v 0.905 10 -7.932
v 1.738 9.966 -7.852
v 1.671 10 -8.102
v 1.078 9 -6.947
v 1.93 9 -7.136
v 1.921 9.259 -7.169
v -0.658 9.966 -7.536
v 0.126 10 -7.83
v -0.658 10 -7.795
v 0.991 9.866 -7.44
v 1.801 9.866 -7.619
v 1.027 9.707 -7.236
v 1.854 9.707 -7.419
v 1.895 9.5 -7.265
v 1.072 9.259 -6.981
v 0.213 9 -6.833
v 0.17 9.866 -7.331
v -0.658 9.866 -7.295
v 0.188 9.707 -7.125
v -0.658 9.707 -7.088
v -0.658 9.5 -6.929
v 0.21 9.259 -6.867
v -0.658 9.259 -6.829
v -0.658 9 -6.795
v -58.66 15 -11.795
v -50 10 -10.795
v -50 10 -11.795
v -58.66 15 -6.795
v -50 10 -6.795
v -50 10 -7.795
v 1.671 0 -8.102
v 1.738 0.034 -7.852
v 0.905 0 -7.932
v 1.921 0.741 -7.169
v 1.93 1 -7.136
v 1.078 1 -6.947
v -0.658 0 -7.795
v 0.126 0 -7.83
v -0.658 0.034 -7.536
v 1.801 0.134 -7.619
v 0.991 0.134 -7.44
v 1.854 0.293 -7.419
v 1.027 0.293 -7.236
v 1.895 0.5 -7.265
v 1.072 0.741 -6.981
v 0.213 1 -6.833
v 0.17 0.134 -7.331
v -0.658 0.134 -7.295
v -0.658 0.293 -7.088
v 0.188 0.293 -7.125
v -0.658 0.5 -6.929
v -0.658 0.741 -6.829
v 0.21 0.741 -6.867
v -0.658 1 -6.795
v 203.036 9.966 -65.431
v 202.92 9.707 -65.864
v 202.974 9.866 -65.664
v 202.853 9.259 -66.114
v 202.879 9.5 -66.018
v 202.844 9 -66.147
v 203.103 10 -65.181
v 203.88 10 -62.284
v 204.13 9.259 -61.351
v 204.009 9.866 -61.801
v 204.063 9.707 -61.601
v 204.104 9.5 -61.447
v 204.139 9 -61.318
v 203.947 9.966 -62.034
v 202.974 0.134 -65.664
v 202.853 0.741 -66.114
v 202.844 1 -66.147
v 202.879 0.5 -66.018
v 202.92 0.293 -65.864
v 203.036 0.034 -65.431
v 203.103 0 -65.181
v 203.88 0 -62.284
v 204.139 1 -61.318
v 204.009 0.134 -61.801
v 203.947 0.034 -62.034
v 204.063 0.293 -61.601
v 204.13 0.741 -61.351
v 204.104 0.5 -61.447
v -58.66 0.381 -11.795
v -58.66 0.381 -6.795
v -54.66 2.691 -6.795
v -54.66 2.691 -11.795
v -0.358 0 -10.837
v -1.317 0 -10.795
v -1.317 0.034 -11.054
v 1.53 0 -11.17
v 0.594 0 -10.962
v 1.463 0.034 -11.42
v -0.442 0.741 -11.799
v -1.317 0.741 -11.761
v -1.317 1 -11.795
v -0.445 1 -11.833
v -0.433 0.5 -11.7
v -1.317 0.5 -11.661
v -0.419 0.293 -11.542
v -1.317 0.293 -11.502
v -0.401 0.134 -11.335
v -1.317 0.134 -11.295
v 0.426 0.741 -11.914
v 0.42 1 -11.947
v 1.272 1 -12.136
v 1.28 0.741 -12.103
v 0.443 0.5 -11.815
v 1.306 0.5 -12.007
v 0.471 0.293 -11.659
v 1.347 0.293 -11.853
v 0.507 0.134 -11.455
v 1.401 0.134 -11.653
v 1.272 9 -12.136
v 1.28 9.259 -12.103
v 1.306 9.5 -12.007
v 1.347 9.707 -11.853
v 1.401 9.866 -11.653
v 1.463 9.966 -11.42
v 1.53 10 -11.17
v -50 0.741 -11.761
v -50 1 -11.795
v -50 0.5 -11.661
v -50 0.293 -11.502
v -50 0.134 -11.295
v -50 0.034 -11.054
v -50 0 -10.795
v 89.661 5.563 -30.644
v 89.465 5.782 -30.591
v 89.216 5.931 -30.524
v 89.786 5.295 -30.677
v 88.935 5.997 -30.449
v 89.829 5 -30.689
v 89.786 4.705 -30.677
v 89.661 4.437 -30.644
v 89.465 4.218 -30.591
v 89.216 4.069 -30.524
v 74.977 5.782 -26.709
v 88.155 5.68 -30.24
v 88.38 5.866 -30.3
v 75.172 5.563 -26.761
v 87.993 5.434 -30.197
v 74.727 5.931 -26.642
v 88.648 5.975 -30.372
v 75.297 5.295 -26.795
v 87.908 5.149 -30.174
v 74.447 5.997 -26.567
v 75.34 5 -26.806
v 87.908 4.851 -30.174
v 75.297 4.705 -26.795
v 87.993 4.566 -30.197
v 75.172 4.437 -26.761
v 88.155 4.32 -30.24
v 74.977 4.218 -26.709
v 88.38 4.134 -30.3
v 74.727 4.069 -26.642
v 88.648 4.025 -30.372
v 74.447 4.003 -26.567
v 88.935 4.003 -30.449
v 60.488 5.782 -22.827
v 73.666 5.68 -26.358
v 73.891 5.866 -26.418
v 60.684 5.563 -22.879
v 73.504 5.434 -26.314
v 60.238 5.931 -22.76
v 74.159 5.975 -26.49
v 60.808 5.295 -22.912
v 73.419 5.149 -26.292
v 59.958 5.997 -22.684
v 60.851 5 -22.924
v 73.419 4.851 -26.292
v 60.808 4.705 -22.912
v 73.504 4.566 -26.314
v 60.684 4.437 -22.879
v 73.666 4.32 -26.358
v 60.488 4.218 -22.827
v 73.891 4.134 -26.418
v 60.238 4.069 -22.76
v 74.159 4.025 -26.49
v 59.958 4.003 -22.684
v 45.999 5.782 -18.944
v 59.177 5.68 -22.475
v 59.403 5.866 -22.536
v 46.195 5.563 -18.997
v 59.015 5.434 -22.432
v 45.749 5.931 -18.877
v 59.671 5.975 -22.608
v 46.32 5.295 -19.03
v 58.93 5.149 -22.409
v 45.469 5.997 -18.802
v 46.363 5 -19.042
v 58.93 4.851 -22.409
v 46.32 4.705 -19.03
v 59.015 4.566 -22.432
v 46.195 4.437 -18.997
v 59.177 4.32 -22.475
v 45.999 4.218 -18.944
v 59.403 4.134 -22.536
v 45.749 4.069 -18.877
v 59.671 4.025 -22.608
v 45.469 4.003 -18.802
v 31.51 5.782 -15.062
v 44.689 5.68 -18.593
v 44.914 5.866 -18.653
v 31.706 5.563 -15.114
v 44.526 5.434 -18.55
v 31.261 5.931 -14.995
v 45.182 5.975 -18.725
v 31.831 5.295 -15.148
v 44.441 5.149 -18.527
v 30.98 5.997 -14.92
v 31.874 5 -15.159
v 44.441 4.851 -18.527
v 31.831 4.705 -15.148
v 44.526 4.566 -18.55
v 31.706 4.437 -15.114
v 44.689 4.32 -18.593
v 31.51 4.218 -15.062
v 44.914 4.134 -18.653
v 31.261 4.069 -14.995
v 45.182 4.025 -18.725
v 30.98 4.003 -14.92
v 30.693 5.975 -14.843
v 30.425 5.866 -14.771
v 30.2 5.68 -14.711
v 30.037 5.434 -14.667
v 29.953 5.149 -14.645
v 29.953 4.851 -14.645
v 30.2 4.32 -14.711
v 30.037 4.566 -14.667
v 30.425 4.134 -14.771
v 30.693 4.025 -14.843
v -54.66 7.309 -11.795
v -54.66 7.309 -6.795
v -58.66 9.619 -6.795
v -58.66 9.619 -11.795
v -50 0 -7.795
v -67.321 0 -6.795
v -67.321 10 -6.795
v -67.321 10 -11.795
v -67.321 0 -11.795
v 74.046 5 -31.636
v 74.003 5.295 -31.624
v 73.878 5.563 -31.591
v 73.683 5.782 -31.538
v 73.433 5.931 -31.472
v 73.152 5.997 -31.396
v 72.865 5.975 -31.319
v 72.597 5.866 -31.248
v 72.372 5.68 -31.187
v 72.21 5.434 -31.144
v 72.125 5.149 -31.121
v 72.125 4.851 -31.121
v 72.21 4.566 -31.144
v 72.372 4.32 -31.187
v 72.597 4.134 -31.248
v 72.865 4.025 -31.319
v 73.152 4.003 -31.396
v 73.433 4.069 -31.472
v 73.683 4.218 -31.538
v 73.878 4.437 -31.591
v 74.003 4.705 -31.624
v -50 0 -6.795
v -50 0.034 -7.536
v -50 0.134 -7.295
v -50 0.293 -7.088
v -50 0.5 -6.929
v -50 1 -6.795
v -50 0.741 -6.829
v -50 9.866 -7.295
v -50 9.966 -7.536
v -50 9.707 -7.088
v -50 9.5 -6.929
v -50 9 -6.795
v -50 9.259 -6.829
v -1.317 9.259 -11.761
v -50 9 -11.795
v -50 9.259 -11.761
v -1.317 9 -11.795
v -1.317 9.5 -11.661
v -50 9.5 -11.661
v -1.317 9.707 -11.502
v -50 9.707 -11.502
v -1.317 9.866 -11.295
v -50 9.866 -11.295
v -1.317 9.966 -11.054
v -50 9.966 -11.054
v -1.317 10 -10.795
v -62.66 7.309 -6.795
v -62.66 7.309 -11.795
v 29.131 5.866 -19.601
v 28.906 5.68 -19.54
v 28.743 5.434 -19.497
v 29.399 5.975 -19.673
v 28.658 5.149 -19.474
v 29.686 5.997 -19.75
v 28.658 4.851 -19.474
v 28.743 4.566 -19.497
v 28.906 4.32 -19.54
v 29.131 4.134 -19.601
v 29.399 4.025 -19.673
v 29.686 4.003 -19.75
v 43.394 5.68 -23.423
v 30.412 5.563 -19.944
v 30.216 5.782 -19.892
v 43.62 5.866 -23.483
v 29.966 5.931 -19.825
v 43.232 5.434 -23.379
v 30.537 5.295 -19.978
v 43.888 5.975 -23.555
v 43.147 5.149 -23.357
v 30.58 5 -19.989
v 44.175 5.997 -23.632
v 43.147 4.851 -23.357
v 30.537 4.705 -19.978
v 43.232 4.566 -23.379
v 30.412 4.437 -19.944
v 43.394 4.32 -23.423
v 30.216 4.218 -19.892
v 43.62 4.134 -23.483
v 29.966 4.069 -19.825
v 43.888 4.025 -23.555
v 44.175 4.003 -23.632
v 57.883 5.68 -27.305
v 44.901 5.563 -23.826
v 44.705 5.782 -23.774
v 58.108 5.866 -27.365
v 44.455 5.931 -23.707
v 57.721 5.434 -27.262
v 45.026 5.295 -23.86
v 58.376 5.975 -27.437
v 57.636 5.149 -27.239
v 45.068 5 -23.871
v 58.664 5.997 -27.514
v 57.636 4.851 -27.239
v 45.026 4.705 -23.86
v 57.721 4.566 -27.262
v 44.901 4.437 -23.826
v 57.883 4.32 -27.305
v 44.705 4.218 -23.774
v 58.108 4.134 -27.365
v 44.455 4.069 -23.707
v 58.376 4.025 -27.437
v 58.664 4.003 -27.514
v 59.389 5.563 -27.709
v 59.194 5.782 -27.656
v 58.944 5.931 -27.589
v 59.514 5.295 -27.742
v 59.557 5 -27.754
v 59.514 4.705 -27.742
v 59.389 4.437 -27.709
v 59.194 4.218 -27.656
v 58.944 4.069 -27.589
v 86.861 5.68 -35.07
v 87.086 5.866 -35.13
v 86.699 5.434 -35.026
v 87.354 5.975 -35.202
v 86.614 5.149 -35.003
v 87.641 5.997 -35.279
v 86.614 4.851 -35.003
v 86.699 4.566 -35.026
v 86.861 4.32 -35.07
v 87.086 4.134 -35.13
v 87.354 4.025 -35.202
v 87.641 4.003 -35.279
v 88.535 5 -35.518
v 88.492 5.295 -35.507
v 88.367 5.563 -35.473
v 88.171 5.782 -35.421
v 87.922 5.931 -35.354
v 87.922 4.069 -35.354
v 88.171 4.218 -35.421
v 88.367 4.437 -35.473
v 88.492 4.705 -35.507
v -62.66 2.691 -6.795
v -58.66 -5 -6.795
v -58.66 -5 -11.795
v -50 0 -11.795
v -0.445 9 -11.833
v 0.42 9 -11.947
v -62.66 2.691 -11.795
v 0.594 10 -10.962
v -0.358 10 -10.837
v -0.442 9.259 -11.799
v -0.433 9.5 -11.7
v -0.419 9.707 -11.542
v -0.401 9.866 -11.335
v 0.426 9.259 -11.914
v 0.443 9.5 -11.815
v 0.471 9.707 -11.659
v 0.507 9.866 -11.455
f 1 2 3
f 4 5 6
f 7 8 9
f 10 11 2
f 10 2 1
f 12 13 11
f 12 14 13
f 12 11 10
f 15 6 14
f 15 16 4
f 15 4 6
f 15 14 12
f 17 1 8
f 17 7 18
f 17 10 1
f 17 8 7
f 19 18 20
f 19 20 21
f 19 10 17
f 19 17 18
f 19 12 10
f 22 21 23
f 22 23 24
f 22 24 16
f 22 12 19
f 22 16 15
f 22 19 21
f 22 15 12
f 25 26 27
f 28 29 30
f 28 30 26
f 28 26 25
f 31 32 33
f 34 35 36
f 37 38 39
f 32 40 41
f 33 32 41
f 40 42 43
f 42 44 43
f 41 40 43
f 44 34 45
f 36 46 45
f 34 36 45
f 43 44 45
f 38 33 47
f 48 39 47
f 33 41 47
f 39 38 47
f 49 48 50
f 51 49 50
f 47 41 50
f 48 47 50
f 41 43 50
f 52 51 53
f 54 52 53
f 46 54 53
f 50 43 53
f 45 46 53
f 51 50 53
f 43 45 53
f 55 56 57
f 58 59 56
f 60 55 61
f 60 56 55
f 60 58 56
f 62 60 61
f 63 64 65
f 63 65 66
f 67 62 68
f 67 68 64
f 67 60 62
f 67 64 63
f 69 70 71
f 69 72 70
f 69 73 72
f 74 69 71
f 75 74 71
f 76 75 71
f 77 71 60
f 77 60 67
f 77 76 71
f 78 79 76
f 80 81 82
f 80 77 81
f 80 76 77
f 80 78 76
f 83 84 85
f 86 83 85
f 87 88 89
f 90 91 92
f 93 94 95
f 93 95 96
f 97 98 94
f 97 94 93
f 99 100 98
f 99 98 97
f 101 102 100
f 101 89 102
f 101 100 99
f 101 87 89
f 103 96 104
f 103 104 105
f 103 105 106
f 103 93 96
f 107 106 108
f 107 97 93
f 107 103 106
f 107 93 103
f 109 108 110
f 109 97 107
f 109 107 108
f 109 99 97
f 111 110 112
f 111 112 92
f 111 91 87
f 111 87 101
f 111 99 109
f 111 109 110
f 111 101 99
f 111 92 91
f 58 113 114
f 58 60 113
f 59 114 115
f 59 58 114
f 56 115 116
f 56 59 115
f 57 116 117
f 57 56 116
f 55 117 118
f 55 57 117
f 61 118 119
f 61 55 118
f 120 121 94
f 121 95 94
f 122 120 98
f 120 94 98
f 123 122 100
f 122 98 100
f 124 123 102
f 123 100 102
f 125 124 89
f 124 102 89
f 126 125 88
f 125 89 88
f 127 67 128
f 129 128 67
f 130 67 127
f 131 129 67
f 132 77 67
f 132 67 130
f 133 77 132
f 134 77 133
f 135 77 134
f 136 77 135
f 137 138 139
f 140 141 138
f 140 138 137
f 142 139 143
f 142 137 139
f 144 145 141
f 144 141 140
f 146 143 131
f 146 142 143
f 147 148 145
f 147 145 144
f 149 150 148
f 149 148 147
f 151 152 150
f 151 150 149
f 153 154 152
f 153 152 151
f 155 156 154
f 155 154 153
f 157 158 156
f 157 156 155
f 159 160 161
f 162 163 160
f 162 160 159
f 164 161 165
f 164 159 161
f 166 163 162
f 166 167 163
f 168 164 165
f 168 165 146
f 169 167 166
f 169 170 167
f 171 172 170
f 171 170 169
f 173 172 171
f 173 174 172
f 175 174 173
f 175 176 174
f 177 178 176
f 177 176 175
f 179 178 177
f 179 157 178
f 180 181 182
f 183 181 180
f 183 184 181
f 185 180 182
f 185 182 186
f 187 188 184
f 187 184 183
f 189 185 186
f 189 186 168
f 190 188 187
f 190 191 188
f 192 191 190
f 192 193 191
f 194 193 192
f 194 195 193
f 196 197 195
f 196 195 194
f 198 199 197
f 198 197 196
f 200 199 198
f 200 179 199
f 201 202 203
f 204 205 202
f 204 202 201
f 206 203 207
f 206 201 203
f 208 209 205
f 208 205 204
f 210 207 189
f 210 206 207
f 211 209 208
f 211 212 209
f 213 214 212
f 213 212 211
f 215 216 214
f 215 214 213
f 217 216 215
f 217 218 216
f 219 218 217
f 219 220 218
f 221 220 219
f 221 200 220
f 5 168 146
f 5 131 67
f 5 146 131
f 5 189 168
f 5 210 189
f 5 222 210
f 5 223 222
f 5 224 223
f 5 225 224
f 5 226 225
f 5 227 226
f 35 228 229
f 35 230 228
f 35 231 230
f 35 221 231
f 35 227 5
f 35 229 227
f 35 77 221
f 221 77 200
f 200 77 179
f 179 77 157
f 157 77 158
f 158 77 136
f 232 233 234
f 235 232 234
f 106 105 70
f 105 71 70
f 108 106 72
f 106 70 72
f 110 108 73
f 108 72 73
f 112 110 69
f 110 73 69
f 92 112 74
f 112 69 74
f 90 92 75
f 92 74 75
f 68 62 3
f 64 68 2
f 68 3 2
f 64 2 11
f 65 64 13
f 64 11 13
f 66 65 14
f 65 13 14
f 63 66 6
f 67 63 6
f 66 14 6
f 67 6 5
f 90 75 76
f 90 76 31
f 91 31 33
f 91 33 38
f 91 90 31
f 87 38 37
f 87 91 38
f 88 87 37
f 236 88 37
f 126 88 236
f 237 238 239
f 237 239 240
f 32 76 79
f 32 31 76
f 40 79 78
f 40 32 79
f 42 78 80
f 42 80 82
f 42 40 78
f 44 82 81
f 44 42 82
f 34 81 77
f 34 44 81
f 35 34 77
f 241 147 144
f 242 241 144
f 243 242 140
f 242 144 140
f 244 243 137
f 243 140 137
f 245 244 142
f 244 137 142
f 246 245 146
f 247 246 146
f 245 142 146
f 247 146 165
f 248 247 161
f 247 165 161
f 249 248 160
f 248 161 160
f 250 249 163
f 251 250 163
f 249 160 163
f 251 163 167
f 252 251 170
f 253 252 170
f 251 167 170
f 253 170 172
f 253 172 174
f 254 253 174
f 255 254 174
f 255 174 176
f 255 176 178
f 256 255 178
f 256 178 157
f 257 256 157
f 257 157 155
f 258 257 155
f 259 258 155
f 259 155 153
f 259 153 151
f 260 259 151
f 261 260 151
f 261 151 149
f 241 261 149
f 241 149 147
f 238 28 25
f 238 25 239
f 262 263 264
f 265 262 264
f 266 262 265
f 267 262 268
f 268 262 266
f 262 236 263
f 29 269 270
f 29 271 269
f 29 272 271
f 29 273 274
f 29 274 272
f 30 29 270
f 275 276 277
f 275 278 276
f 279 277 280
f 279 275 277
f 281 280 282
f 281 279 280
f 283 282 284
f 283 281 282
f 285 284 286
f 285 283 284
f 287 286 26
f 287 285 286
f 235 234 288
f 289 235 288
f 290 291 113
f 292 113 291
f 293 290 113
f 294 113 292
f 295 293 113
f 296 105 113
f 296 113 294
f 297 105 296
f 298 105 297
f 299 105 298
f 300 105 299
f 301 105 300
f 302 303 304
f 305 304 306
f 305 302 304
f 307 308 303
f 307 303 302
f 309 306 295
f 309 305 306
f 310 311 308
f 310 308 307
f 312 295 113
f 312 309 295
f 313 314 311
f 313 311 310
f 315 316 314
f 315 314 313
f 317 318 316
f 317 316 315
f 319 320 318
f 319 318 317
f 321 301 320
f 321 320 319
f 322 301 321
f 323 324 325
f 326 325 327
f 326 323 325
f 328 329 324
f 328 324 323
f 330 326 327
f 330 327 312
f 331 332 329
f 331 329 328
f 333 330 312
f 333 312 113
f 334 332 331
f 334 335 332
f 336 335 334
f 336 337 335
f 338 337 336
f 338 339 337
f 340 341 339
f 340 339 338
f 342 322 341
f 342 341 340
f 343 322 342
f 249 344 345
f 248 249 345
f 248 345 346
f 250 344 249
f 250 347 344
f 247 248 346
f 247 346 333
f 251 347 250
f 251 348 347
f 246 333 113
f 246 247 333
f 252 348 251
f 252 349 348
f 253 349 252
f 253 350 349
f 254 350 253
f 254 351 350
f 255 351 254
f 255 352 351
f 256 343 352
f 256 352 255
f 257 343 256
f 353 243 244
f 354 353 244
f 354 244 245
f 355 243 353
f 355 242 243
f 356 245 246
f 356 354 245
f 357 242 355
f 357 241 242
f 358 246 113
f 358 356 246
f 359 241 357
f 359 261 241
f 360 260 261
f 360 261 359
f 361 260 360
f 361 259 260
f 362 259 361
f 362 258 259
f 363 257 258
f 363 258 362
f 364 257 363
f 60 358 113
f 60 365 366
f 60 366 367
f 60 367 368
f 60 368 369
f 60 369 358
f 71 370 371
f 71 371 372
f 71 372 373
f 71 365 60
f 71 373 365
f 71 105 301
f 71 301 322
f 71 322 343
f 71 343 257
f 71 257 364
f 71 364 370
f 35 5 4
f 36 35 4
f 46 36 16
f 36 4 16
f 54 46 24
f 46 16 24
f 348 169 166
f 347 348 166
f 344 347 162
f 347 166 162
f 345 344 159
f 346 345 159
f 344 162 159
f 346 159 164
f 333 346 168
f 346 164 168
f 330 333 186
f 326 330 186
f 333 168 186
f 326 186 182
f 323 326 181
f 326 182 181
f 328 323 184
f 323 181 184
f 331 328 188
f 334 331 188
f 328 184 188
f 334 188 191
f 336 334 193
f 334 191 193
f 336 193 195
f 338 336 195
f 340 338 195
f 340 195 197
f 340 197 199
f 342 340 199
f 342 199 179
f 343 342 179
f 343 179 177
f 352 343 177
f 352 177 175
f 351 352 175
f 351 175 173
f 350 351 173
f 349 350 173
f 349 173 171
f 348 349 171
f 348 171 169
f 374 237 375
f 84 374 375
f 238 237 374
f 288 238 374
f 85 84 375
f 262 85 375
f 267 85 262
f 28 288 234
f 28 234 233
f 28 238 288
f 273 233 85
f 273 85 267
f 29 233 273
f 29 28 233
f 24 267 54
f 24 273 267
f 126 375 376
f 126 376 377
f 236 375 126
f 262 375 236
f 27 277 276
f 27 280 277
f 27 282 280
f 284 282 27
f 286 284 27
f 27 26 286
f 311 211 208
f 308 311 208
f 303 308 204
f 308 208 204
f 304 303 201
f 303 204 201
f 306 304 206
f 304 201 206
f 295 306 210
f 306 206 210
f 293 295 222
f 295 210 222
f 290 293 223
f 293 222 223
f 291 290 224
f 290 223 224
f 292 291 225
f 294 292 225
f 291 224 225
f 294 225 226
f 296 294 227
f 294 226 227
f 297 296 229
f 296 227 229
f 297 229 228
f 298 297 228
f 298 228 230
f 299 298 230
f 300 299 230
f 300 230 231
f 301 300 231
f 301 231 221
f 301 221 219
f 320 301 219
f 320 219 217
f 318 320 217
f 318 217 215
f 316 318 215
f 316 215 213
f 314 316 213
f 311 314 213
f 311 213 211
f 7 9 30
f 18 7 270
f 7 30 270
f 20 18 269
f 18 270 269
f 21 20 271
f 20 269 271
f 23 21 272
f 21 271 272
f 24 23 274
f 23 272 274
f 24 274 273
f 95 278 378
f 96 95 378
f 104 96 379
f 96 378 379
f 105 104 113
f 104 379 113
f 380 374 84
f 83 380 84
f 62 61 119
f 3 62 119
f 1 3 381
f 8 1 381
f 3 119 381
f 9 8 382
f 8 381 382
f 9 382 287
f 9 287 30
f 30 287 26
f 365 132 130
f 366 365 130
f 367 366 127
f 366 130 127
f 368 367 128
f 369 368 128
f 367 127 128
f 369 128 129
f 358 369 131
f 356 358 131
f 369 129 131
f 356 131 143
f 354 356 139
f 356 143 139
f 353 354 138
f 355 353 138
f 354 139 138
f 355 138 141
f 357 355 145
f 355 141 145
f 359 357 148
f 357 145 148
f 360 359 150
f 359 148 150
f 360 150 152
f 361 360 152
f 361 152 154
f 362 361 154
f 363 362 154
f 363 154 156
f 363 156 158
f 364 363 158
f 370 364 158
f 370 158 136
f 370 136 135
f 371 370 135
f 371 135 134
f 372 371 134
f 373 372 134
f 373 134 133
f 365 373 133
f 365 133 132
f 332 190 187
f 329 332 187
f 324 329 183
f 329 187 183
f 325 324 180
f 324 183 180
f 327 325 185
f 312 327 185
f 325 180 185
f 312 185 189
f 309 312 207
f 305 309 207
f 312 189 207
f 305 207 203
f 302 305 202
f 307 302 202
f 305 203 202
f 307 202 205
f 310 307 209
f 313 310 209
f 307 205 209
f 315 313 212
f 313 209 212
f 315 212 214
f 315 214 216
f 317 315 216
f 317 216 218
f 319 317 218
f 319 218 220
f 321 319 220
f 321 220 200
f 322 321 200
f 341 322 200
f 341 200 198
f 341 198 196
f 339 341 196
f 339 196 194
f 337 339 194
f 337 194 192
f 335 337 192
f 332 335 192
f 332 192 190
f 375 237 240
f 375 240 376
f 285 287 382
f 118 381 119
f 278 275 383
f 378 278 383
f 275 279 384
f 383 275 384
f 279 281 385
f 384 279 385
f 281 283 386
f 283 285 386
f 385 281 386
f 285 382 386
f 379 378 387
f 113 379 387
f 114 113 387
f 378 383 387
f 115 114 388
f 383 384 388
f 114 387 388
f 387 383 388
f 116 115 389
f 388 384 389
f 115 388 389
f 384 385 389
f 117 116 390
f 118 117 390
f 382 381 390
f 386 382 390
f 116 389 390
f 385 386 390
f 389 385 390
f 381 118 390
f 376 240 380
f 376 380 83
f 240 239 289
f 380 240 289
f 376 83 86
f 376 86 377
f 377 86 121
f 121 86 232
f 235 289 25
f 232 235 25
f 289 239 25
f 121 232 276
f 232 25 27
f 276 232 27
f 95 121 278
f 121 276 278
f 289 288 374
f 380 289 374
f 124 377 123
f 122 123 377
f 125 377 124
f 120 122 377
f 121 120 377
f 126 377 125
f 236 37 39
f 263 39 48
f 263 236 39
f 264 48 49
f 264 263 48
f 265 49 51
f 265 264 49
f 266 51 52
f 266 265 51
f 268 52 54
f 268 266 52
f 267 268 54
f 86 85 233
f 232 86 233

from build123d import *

# Parameters (mm, degrees)
BOSS_EXTRUDE1_DEPTH = 10
FILLET1_R           = 10
FILLET2_R           = 1
BOSS_EXTRUDE2_DEPTH = 5
CUT_EXTRUDE1_REACH  = 216.878
SKETCH3_R           = 1


with BuildPart() as part:
    # Sketch1 → Boss-Extrude1 (new body)
    with BuildSketch(Plane(origin=(0, 0, 0), x_dir=(1, 0, 0), z_dir=(0, 1, 0))):
        Polygon((-50, 11.795260846), (0, 11.795260846), (202.844423521, 66.147260317), (204.138518746, 61.317631186), (0.658262488, 6.795260846), (-50, 6.795260846), align=None)
    extrude(amount=BOSS_EXTRUDE1_DEPTH)

    # Fillet1
    fillet1_edges = [part.edges().sort_by_distance(p)[0] for p in [
        (0, 5, -11.795260846),
        (0.658262488, 5, -6.795260846),
    ]]
    fillet(fillet1_edges, radius=FILLET1_R)

    # Fillet2
    fillet2_edges = [part.edges().sort_by_distance(p)[0] for p in [
        (-25.658262488, 0, -11.795260846),
        (-25.658262488, 10, -11.795260846),
        (102.058044498, 10, -39.14163145),
        (103.034223355, 0, -34.226816884),
        (103.034223355, 10, -34.226816884),
        (0.646999434, 0, -6.880812232),
        (0.646999434, 10, -6.880812232),
        (-0.011263054, 0, -11.880812232),
        (-0.011263054, 10, -11.880812232),
        (102.058044498, 0, -39.14163145),
        (-25.329131244, 0, -6.795260846),
        (-25.329131244, 10, -6.795260846),
    ]]
    fillet(fillet2_edges, radius=FILLET2_R)

    # Sketch2 → Boss-Extrude2 (add)
    with BuildSketch(Plane.XY.offset(-6.795260846)):
        Polygon((-67.320508076, 0), (-58.660254038, -5), (-50, 0), (-50, 10), (-58.660254038, 15), (-67.320508076, 10), align=None)
        Polygon((-54.660254038, 2.690598923), (-54.660254038, 7.309401077), (-58.660254038, 9.618802154), (-62.660254038, 7.309401077), (-62.660254038, 2.690598923), (-58.660254038, 0.381197846), align=None, mode=Mode.SUBTRACT)
    extrude(amount=-BOSS_EXTRUDE2_DEPTH)

    # Sketch3 → Cut-Extrude1 (cut, up to next)
    with BuildSketch(Plane(origin=(-1.654719986, 0, -6.17549906), x_dir=(0.9659258262890681, 0, -0.2588190451025216), z_dir=(0.2588190451025216, 0, 0.9659258262890681)), mode=Mode.PRIVATE) as cut_extrude1_sk1:
        with Locations((33.711100637, 5)):
            Circle(SKETCH3_R)
    cut_extrude1_tool1 = extrude(cut_extrude1_sk1.sketch, amount=-CUT_EXTRUDE1_REACH, mode=Mode.PRIVATE) & part.part
    # Sketch3 → Cut-Extrude1 (cut, up to next)
    with BuildSketch(Plane(origin=(-1.654719986, 0, -6.17549906), x_dir=(0.9659258262890681, 0, -0.2588190451025216), z_dir=(0.2588190451025216, 0, 0.9659258262890681)), mode=Mode.PRIVATE) as cut_extrude1_sk2:
        with Locations((48.711100637, 5)):
            Circle(SKETCH3_R)
    cut_extrude1_tool2 = extrude(cut_extrude1_sk2.sketch, amount=-CUT_EXTRUDE1_REACH, mode=Mode.PRIVATE) & part.part
    # Sketch3 → Cut-Extrude1 (cut, up to next)
    with BuildSketch(Plane(origin=(-1.654719986, 0, -6.17549906), x_dir=(0.9659258262890681, 0, -0.2588190451025216), z_dir=(0.2588190451025216, 0, 0.9659258262890681)), mode=Mode.PRIVATE) as cut_extrude1_sk3:
        with Locations((63.711100637, 5)):
            Circle(SKETCH3_R)
    cut_extrude1_tool3 = extrude(cut_extrude1_sk3.sketch, amount=-CUT_EXTRUDE1_REACH, mode=Mode.PRIVATE) & part.part
    # Sketch3 → Cut-Extrude1 (cut, up to next)
    with BuildSketch(Plane(origin=(-1.654719986, 0, -6.17549906), x_dir=(0.9659258262890681, 0, -0.2588190451025216), z_dir=(0.2588190451025216, 0, 0.9659258262890681)), mode=Mode.PRIVATE) as cut_extrude1_sk4:
        with Locations((78.711100637, 5)):
            Circle(SKETCH3_R)
    cut_extrude1_tool4 = extrude(cut_extrude1_sk4.sketch, amount=-CUT_EXTRUDE1_REACH, mode=Mode.PRIVATE) & part.part
    # Sketch3 → Cut-Extrude1 (cut, up to next)
    with BuildSketch(Plane(origin=(-1.654719986, 0, -6.17549906), x_dir=(0.9659258262890681, 0, -0.2588190451025216), z_dir=(0.2588190451025216, 0, 0.9659258262890681)), mode=Mode.PRIVATE) as cut_extrude1_sk5:
        with Locations((93.711100637, 5)):
            Circle(SKETCH3_R)
    cut_extrude1_tool5 = extrude(cut_extrude1_sk5.sketch, amount=-CUT_EXTRUDE1_REACH, mode=Mode.PRIVATE) & part.part
    add(cut_extrude1_tool1.solids().sort_by_distance((30.907703, 5, -14.900574))[0], mode=Mode.SUBTRACT)
    add(cut_extrude1_tool2.solids().sort_by_distance((45.39659, 5, -18.78286))[0], mode=Mode.SUBTRACT)
    add(cut_extrude1_tool3.solids().sort_by_distance((59.885478, 5, -22.665145))[0], mode=Mode.SUBTRACT)
    add(cut_extrude1_tool4.solids().sort_by_distance((74.374365, 5, -26.547431))[0], mode=Mode.SUBTRACT)
    add(cut_extrude1_tool5.solids().sort_by_distance((88.863252, 5, -30.429717))[0], mode=Mode.SUBTRACT)


solid = part.part
